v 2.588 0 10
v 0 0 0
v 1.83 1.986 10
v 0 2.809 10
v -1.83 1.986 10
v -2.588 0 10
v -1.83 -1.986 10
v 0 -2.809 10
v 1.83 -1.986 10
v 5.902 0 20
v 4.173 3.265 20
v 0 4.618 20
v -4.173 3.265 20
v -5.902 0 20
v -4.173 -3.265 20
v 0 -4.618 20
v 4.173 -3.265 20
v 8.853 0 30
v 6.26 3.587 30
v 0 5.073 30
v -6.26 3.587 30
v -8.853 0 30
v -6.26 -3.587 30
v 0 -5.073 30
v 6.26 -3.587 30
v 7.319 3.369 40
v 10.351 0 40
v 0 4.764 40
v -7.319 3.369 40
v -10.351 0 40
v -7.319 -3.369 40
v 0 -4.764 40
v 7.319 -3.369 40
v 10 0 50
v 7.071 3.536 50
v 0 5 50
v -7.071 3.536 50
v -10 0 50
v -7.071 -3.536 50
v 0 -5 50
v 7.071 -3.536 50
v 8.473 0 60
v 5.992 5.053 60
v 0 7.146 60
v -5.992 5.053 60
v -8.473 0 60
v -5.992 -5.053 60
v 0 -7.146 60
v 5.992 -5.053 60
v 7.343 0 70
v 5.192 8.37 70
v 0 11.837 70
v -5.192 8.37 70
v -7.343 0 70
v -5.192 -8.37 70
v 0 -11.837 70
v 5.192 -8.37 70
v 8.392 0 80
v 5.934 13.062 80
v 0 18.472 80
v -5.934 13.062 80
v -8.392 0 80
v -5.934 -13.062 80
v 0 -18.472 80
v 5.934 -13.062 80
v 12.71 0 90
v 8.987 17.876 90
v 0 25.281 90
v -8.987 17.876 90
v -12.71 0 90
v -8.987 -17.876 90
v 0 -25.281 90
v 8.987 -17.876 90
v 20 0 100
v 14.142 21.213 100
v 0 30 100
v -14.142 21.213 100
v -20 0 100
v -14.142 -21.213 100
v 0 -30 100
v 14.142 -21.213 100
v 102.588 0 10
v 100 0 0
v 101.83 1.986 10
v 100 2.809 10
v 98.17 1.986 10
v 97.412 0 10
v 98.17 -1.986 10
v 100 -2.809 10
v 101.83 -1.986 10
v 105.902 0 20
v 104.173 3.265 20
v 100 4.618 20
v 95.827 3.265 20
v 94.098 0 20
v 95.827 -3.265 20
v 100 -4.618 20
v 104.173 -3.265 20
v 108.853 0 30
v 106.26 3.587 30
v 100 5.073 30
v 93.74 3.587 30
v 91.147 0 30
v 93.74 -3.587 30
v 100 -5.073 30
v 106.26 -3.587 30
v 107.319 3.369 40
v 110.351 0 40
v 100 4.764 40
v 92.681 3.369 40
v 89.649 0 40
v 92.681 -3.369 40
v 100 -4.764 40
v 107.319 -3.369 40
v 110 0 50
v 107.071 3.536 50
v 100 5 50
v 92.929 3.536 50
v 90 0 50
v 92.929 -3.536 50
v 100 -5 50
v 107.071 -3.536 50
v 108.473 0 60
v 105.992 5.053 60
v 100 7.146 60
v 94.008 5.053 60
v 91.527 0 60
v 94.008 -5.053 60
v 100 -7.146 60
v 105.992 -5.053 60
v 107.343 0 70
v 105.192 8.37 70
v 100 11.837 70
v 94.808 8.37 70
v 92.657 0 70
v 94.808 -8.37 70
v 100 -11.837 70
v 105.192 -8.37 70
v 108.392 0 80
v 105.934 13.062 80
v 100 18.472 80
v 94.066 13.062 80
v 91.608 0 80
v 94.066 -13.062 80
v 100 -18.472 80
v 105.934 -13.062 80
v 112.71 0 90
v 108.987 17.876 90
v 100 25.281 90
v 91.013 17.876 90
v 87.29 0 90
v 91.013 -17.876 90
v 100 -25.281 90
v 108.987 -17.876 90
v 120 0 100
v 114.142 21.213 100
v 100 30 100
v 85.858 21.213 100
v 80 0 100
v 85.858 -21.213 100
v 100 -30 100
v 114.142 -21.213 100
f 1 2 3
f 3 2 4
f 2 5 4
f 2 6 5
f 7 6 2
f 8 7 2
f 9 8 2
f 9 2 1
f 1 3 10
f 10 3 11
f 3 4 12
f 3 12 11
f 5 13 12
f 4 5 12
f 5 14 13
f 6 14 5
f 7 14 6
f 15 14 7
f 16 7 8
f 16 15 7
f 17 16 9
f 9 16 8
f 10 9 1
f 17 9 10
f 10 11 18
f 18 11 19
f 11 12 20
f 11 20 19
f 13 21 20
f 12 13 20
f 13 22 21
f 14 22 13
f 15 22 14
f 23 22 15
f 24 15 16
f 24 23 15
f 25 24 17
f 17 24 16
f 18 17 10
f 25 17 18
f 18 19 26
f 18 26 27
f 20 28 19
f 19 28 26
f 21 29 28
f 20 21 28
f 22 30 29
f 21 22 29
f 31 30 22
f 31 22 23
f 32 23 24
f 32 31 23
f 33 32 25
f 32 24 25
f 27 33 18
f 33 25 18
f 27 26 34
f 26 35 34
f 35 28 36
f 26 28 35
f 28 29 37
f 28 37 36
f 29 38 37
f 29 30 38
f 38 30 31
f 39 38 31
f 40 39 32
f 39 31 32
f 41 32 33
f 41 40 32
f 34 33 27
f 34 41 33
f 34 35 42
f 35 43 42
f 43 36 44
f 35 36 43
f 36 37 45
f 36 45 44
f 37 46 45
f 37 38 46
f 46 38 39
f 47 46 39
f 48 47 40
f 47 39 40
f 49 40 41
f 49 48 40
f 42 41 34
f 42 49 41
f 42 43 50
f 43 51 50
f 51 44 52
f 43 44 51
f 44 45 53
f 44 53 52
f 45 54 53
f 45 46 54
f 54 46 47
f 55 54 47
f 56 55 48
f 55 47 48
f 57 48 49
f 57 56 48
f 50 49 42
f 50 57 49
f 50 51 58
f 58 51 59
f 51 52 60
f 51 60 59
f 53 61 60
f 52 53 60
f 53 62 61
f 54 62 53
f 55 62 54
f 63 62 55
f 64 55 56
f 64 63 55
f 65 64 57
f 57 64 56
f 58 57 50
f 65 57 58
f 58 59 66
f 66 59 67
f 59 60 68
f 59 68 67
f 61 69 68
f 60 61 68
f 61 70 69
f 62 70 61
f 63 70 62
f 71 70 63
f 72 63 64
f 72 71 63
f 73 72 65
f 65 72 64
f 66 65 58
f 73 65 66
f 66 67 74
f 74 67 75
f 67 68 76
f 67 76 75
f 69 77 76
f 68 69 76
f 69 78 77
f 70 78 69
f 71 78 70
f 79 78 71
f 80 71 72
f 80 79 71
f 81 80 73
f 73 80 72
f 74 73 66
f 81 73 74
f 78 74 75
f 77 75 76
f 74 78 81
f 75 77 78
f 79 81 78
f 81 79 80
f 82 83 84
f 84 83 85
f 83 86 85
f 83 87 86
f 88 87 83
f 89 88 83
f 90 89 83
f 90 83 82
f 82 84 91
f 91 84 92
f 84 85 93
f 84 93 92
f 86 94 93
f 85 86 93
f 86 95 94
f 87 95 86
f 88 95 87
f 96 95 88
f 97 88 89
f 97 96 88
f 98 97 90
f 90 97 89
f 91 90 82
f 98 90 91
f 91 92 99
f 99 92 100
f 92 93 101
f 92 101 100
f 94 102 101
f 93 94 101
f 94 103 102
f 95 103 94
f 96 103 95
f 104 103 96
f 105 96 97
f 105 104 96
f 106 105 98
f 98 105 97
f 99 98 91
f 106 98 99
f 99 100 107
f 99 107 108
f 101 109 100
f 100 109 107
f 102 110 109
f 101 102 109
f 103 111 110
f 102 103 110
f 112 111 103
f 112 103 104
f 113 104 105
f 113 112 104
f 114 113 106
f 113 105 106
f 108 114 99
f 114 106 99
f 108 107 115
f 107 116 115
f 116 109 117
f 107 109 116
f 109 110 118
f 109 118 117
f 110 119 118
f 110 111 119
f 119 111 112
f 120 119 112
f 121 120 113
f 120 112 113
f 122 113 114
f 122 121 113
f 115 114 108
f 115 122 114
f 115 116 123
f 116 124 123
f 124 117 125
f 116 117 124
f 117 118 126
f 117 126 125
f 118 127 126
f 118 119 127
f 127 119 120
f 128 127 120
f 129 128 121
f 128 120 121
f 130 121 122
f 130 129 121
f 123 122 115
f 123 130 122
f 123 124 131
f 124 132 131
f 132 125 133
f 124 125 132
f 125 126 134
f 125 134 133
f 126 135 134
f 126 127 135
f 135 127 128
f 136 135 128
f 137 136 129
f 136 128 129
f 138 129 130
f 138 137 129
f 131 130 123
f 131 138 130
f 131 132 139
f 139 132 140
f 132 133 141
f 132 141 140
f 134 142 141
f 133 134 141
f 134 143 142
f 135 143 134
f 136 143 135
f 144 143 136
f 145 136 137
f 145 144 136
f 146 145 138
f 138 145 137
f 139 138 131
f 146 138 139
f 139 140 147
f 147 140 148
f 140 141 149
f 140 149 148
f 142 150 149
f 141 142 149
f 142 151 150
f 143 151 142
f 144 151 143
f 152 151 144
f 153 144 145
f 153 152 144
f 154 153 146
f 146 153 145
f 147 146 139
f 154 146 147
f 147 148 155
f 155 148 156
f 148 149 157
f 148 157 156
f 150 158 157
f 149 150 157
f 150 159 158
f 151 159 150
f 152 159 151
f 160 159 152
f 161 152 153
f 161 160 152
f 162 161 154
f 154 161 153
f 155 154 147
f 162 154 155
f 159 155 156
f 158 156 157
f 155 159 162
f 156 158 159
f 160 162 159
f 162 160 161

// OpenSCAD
// file: ../lib/TOGMod1.scad
// TOGMod1
// OpenSCAD library for representing shapes
// 
// See also: Functional OpenSCAD (https://github.com/thehans/FunctionalOpenSCAD)

module togmod1_domodule(mod) {
	assert(is_list(mod));
	assert(len(mod) > 0);
	if( mod[0] == "polygon-vp" ) {
		// ["polygon-vp", vertexes, paths]
		polygon(points=mod[1], paths=mod[2]);
	} else if( mod[0] == "polyhedron-vf" ) {
		polyhedron(mod[1], faces=mod[2]);
	} else if( mod[0] == "scale" ) {
		assert(len(mod) == 3);
		scale(mod[1]) togmod1_domodule(mod[2]);
	} else if( mod[0] == "translate" ) {
		assert(len(mod) == 3);
		translate(mod[1]) togmod1_domodule(mod[2]);
	} else if( mod[0] == "intersection" ) {
		intersection_for( i=[1:1:len(mod)-1] ) togmod1_domodule(mod[i]);
	} else if( mod[0] == "difference" ) {
		difference() {
			togmod1_domodule(mod[1]);
			for( i=[2:1:len(mod)-1] ) togmod1_domodule(mod[i]);
		}
	} else if( mod[0] == "union" ) {
		for( i=[1:1:len(mod)-1] ) togmod1_domodule(mod[i]);
	} else if( mod[0] == "hull" ) {
		hull() for( i=[1:1:len(mod)-1] ) togmod1_domodule(mod[i]);
	} else if( mod[0] == "linear-extrude-zs" ) {
		// ["linear-extrude-zs", [z0,z1], 2d_shape] // centered
		// ["linear-extrude-zs", height, 2d_shape]
		let( zrange = is_list(mod[1]) ? mod[1] : [-mod[1]/2, mod[1]/2] ) {
			translate([0,0,zrange[0]]) linear_extrude(zrange[1]-zrange[0]) togmod1_domodule(mod[2]);
		}
	} else if( mod[0] == "x-debug" ) {
		# togmod1_domodule(mod[1]);
	} else {
		assert(false, str("Unrecognized shape: ", mod[0]));
	}
}
// file: ../lib/TOGArrayLib1.scad
// TOGArrayLib1.0
// 
// Functions for working with arrays.

function tal1_reduce(start, items, func, offset=0) =
	len(items) == offset ? start :
   tal1_reduce(func(start, items[offset]), items, func, offset+1);

function tal1_consecutive_duplicate_count(items) = tal1_reduce(
	[0, undef],
	items,
	function(z,item) [z[0] + (item == z[1] ? 1 : 0), item]
)[0];

assert(0 == tal1_consecutive_duplicate_count([]));
assert(0 == tal1_consecutive_duplicate_count([50]));
assert(1 == tal1_consecutive_duplicate_count([50,50]));
assert(0 == tal1_consecutive_duplicate_count([50,51,52,53]));
assert(1 == tal1_consecutive_duplicate_count([50,51,52,52]));
assert(3 == tal1_consecutive_duplicate_count([50,50,50,50]));

// Set test_size to arbirarily large values
// to ensure that OpenSCAD can handle heavy recursion
let(test_size=1000) assert(test_size/2 == tal1_consecutive_duplicate_count([for(i=[0:1:test_size-1]) floor(i/2)]));



function tal1_uniq_(items, off0, off1) =
	let(chunklen = off1-off0)
	chunklen == 0 ? [] :
	chunklen == 1 ? [items[off0]] :
	let(half=floor(chunklen/2))
	let(left  = tal1_uniq_(items, off0     , off0+half))
	let(right = tal1_uniq_(items, off0+half, off1     ))
	assert(len(left) > 0)
	assert(len(right) > 0)
	left[len(left)-1] == right[0] ? [each left, for(i=[1:1:len(right)-1]) right[i]] :
	[each left, each right];

/** Given a list of items, returns a new list with identical consecutive items merged */
function tal1_uniq(items) = tal1_uniq_(items, 0, len(items));

assert([] == tal1_uniq([]));
assert([123] == tal1_uniq([123]));
assert([55,0,1,2,3] == tal1_uniq([55,0,1,2,3]));
assert([55,0,1,2] == tal1_uniq([55,0,1,1,2]));
assert([55,0,1] == tal1_uniq([55,55,0,0,0,0,0,0,1,1,1,1]));
assert([55,0] == tal1_uniq([55,0,0,0,0,0,0,0]));



/**
 * Returns [new items, old index -> new index mapping].
 * No-op version.
 */
function tal1_uniq_remap_v1(items) =
	["list-remap-result", items, [for (vi=[0:1:len(items)-1]) vi]];

// [a, a, b, b, c, c]
//
// [a,    ...], []  -> [a],[0]
// [a, a, ...], [0] -> [a],[0,0]

assert([1,2,3] == [1,2,3]);

/**
 * Recursive version that will combine adjacent identical vertexes,
 * but will use the original items.
 */
function tal1_uniq_remap_v2(items, map=[]) =
	let(index = len(map))
	len(items) == index ? ["list-remapping", items, map] :
	index == 0 ? tal1_uniq_remap_v2(items, [0]) :
	items[index] == items[map[index-1]] ? tal1_uniq_remap_v2(items, [for(vi=map) vi, map[index-1]]) :
	tal1_uniq_remap_v2(items, [for(vi=map) vi, index]);

assert(tal1_uniq_remap_v2([1,1,2,2,3,4]) == ["list-remap-result", [1,1,2,2,3,4], [0,0,2,2,4,5]]);
// main file
// Plan:
// 1. [ ] Write in OpenSCAD
// 2. [ ] Iteratively translate to TOSLisp
// 3. [ ] Export to lisp
// 4. [ ] Compile lisp back to TOSLisp
// 5. [ ] Compile lisp directly to OpenSCAD

// The vertices should be in counter-clockwise order when the vertices
// are viewed from outside of the object. (Obviously, viewing from
// inside the object they are then in clockwise order).
// -- https://stackoverflow.com/questions/8715822/triangle-vertex-winding-order-in-stereolithography-stl-files-triangulated-obj
//
// Let's assume layers are defined as follows:
// - Layers are listed bottom-to-top (-Z to +Z)
// - Layer vertexes are listed counter-clockwise
//   when viewed from the top (e.g. +X, +Y, -X, -Y)

// Use an intermediate ["tlpoly-ls", layers, layerspan] representation?  Should not affect output.
use_eval = false;
triangulate_faces = false;
vertex_consolidation_enabled = true;
face_fixing_enabled = true;

function polygen_cap_faces( layers, layerspan, li, reverse=false ) = [
	[for( vi=reverse ? [layerspan-1 : -1 : 0] : [0 : 1 : layerspan-1] ) (vi%layerspan)+layerspan*li]
];

function polygen_layer_faces( layers, layerspan, i ) =
let( l0 = i*layerspan )
let( l1 = (i+1)*layerspan )
triangulate_faces ? [
	for( vi=[0 : 1 : len(layers[i])-1] ) each [
		[
			l0 + vi,
			l0 + (vi+1) % layerspan,
			l1 + (vi+1)%layerspan,
		],
		[
			l0 + vi,
			l1 + (vi+1)%layerspan,
			l1 + vi
		],
	]
] : [
	for( vi=[0 : 1 : len(layers[i])-1] ) [
		l0 + vi,
		l0 + (vi+1) % layerspan,
		l1 + (vi+1)%layerspan,
		l1 + vi
	]
];

function polygen_faces( layers, layerspan ) = echo(layerspan=layerspan) [
	each polygen_cap_faces( layers, layerspan, 0, reverse=true),
	// For now, assume convex end caps
	for( li=[0 : 1 : len(layers)-2] ) each polygen_layer_faces(layers, layerspan, li),
	each polygen_cap_faces( layers, layerspan, len(layers)-1, reverse=false )
];

function polygen_points(layers, layerspan) = [
	for( layer=layers ) for( point=layer ) point
];

polytest_layer_count = 10;
polytest_vertexes_per_layer = 8;

// Multiple instances to help detect invalid polyhedrons;
// render will sometimes appear to succeed if only one.
instance_count = 2;

polytest_layers = [
	for( t=[0 : 1 : polytest_layer_count] ) [
		for( vi=[0 : 1 : polytest_vertexes_per_layer-1] ) [
			t/polytest_layer_count*(2+sin(t*360/10))*cos(vi * 360 / polytest_vertexes_per_layer),
			t/polytest_layer_count*(2+cos(t*360/10))*sin(vi * 360 / polytest_vertexes_per_layer),
			t
		]
	]
];

function tlpoly_make_from_layers(layers) = [
	"tlpoly-ls", // layers, span
	layers,
	len(layers[0])
];

function tlpoly_eval(mod) = assert(mod[0] == "tlpoly-ls") assert(len(mod) == 3)
	["polyhedron-vf", polygen_points(mod[1], mod[2]), polygen_faces(mod[1], mod[2])];

function tlpoly_make_polyhedron(layers) =
	["polyhedron-vf", polygen_points(layers, len(layers[0])), polygen_faces(layers, len(layers[0]))];



use <../lib/TOGArrayLib1.scad>

function remap(indexes, index_map) = [
	for(i=indexes) index_map[i]
];

function remap_face_vertexes(faces, index_map, face_fixing=true) = [
	for( face=faces )
		let(face1=remap(face, index_map))
		let(face2=face_fixing ? tal1_uniq(face1) : face1)
		each len(face2) > 1 ? [face2] : []
];

/*function fix_faces(faces) = [
	for( face=faces ) let(newface=tal1_uniq(face)) each len(newface) > 1 ? [newface] : []
];*/

// Pick which version to use
uniq_remap = function (v) tal1_uniq_remap_v2(v);

poly_tm_1 =
	use_eval ? tlpoly_eval(tlpoly_make_from_layers(polytest_layers)) :
	tlpoly_make_polyhedron(polytest_layers);

vertex_remap_result = uniq_remap(poly_tm_1[1]);
echo(vertex_remap_result=vertex_remap_result);

poly_tm = vertex_consolidation_enabled ? ["polyhedron-vf",
	vertex_remap_result[1],
	remap_face_vertexes(poly_tm_1[2], vertex_remap_result[2], face_fixing=face_fixing_enabled)
] : poly_tm_1;



echo(str(
	len(poly_tm[2]), " faces on resulting polyhedron; ",
	tal1_reduce(0, poly_tm[2], function(c,face) c + tal1_consecutive_duplicate_count(face) > 0 ? 1 : 0), " faces contain duplicate points"
));


use <../lib/TOGMod1.scad>

togmod1_domodule(["scale", [10,10,10], ["union", for(i=[0:1:instance_count-1]) ["translate", [i*10, 0, 0], poly_tm]]]);
